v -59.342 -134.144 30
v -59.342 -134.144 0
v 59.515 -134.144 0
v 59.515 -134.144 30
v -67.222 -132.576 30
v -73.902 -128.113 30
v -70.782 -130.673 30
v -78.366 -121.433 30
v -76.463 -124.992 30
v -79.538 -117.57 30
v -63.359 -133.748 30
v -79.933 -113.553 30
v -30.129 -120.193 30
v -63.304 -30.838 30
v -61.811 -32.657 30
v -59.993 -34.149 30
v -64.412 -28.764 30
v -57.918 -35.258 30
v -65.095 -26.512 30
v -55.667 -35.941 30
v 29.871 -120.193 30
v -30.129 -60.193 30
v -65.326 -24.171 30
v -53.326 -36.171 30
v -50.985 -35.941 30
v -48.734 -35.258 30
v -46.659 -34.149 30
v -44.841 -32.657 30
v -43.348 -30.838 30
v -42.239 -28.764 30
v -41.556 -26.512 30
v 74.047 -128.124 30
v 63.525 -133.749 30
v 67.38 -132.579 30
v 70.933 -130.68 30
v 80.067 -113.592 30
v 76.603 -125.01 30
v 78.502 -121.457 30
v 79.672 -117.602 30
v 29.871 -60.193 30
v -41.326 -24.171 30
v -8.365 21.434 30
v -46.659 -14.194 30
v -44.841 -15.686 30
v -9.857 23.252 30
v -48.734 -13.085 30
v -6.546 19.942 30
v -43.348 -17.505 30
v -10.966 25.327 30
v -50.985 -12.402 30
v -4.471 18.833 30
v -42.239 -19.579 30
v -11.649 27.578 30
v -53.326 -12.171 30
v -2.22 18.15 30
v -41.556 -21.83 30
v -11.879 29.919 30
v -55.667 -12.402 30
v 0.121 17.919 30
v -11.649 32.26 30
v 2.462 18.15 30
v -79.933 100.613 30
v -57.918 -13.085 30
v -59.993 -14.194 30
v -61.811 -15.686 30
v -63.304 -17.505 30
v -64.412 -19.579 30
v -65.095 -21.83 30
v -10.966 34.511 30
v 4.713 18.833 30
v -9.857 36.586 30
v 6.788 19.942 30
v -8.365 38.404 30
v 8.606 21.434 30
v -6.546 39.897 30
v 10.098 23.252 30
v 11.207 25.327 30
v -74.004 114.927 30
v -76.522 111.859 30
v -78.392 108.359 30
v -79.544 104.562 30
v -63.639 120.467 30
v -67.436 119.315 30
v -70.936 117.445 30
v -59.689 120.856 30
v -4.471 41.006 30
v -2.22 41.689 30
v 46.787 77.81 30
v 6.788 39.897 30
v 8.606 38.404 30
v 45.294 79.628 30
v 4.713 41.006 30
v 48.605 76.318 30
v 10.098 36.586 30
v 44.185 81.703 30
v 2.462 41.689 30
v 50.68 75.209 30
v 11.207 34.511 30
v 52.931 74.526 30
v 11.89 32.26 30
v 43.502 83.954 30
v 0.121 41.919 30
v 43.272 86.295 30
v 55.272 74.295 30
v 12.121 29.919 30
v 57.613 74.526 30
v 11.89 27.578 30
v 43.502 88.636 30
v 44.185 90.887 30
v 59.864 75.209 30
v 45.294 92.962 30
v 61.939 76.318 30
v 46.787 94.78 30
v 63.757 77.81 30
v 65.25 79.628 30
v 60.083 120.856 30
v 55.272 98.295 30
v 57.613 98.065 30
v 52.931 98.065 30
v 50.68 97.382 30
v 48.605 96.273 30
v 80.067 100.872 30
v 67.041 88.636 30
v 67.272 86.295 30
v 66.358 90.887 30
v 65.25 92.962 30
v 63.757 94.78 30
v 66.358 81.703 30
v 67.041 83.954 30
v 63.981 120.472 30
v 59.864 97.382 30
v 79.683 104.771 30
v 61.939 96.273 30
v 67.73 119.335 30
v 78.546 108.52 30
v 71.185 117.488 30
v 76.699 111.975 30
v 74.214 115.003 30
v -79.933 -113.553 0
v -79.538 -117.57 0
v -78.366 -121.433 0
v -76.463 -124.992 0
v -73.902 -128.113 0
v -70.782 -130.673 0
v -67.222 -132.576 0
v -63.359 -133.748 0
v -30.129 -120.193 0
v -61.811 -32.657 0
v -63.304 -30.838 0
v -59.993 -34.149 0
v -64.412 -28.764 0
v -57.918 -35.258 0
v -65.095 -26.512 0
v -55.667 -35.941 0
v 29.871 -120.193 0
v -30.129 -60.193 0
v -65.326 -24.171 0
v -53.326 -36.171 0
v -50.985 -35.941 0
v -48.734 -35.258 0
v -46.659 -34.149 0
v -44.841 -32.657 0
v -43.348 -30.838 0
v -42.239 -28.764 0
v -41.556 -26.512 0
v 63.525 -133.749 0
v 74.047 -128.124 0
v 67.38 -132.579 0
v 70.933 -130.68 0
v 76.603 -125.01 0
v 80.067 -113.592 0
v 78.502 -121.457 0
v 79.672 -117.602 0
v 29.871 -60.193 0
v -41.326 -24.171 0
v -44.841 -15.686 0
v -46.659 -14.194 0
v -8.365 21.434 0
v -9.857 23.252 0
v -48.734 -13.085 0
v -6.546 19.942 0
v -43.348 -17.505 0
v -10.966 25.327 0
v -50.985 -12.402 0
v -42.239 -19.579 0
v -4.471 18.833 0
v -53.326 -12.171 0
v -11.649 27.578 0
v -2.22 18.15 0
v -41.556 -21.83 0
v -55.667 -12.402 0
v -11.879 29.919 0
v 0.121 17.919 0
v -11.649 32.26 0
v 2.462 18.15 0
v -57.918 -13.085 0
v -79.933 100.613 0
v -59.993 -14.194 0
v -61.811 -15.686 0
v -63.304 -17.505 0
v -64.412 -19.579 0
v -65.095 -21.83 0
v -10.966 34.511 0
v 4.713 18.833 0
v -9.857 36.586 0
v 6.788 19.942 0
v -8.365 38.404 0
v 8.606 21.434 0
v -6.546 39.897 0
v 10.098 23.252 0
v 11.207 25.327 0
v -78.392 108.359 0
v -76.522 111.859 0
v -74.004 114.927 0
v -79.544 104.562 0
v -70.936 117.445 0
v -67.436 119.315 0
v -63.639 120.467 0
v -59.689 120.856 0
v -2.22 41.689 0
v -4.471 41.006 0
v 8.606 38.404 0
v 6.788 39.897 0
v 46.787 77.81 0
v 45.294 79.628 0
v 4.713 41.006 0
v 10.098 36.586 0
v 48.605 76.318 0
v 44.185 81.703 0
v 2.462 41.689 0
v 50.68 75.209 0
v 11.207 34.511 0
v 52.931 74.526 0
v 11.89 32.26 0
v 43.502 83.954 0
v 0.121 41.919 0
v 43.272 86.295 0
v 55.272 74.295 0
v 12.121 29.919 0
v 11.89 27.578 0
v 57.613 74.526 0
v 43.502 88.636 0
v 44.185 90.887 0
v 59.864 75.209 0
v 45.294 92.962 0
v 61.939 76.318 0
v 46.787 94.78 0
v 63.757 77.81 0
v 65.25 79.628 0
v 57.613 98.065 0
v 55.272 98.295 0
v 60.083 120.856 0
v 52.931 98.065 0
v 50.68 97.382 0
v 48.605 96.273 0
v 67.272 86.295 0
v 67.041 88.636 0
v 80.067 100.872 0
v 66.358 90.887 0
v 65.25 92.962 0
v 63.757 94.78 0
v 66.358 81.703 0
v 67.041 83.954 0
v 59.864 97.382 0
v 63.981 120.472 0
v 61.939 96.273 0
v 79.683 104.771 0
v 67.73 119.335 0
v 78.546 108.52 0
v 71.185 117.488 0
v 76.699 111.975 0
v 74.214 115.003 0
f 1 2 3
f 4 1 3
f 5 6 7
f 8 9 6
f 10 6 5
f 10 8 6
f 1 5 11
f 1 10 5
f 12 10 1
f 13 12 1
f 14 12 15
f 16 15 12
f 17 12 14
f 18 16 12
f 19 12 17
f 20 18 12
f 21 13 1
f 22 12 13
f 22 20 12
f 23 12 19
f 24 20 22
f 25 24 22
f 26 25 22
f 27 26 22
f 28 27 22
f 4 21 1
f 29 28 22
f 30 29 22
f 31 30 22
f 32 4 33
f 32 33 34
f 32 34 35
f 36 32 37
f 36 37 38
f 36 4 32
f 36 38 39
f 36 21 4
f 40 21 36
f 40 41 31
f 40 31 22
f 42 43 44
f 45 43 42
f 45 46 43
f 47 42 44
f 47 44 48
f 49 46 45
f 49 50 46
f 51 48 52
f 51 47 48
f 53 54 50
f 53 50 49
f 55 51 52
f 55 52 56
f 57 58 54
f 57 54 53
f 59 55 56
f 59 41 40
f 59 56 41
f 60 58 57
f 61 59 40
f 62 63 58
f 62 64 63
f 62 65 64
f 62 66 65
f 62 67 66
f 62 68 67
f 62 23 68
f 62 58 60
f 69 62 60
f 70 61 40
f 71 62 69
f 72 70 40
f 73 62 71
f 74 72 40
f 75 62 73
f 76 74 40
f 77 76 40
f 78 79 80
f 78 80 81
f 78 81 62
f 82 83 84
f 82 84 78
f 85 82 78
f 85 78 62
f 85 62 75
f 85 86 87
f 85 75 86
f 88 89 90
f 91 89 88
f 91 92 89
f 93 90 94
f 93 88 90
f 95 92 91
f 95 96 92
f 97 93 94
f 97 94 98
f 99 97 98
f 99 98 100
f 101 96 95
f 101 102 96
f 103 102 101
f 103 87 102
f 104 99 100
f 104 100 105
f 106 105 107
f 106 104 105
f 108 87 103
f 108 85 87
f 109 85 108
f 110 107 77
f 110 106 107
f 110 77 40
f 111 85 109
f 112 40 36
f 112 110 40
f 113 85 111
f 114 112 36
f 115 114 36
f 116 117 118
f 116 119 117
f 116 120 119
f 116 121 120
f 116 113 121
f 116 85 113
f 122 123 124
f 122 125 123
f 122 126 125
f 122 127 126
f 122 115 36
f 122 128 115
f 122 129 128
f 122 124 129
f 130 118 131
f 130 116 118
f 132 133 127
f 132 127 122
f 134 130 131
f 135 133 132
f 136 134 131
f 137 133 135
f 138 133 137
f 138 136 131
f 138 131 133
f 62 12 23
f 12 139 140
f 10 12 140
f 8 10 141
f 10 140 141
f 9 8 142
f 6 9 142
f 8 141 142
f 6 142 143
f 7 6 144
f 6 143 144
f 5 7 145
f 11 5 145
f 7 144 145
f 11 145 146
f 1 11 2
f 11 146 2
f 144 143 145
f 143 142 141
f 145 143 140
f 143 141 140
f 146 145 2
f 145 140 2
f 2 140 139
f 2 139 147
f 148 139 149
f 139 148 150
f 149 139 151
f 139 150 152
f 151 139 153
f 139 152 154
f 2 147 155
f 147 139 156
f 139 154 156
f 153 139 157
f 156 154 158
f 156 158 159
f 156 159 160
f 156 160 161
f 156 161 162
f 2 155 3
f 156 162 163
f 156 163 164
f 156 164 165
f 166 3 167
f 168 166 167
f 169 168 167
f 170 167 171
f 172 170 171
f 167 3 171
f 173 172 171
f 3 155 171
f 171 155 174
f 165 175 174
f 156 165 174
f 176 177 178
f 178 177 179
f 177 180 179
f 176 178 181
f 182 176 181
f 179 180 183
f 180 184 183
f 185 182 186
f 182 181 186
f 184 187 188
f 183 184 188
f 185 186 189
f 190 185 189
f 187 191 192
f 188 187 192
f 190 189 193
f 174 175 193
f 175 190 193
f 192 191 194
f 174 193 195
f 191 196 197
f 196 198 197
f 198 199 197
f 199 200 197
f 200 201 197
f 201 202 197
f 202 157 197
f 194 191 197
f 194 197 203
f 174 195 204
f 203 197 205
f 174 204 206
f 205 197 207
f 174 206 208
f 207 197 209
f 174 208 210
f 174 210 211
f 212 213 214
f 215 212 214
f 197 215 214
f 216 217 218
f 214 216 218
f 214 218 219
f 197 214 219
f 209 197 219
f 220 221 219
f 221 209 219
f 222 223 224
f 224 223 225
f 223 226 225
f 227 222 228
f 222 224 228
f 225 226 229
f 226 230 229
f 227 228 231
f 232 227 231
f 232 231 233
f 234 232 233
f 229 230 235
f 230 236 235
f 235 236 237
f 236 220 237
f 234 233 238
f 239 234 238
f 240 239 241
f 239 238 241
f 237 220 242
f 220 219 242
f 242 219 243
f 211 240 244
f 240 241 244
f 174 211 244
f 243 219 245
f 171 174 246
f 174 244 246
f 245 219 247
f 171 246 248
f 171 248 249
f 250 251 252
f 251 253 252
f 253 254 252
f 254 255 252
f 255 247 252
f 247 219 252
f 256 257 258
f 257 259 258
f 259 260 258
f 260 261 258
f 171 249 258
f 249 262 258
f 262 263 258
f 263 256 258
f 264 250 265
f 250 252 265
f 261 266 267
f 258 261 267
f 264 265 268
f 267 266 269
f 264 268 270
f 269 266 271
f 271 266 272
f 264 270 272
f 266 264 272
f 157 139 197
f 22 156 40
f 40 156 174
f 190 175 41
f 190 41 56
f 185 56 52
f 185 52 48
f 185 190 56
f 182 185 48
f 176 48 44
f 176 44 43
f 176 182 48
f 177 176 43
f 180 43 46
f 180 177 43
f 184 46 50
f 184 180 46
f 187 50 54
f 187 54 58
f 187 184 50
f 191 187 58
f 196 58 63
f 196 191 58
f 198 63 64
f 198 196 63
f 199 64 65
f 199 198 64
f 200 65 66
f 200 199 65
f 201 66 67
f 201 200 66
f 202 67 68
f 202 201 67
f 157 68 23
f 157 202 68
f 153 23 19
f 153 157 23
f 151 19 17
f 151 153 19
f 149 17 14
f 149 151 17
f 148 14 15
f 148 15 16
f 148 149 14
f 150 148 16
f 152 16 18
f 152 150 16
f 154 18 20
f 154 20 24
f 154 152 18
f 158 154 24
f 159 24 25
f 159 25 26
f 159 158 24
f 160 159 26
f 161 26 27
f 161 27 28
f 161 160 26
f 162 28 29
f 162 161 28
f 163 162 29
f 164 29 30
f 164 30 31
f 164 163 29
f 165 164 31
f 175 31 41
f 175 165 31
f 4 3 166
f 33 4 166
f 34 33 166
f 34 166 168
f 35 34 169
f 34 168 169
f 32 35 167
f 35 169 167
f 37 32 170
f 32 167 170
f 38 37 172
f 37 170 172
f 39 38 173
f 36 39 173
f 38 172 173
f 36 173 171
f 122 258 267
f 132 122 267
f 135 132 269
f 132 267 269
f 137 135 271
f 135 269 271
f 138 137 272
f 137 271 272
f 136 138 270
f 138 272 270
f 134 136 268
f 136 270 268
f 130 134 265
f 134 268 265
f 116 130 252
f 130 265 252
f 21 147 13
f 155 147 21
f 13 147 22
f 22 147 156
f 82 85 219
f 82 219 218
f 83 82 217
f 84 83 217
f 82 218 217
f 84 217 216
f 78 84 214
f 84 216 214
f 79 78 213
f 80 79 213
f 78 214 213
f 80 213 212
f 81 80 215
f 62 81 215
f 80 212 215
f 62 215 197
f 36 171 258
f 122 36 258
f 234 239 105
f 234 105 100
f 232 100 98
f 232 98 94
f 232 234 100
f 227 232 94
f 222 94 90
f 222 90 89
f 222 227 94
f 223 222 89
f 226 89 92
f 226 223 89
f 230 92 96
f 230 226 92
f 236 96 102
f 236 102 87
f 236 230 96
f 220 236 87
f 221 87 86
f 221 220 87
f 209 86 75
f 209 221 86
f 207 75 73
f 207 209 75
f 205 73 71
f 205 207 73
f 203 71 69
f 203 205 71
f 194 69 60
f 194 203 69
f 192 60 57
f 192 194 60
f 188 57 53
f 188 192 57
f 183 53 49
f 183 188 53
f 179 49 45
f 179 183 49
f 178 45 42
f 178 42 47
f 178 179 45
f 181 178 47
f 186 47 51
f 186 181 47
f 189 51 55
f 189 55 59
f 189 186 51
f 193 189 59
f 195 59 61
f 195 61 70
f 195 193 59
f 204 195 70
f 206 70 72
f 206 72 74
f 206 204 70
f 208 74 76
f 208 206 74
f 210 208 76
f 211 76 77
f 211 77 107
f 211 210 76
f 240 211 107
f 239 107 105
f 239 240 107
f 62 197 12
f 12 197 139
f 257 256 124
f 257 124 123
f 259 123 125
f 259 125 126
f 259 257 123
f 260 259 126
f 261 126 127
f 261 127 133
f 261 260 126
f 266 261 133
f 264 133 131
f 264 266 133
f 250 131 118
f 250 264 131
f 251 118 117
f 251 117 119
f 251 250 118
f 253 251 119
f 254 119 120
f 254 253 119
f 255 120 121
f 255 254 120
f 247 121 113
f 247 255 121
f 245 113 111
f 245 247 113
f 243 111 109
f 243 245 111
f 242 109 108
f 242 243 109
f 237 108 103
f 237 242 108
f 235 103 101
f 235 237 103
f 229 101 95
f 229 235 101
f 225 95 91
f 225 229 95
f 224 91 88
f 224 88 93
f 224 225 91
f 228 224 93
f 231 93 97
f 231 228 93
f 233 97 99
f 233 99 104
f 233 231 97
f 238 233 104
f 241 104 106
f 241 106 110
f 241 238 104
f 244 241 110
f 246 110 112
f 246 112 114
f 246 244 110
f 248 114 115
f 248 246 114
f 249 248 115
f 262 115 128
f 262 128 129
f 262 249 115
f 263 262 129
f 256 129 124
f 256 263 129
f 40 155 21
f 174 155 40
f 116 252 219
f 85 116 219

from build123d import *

# Parameters (mm, degrees)
SKETCH_R     = 12
SKETCH_W     = 60
SKETCH_H     = 60
PAD_DEPTH    = 30
PAD001_DEPTH = 30


with BuildPart() as part:
    # Sketch → Pad (new body)
    with BuildSketch(Plane.XY):
        with BuildLine():
            Line((-59.342312, -134.143673), (59.515305, -134.143673))
            ThreePointArc((59.515305, -134.143673), (74.047401, -128.124281), (80.066793, -113.592185))
            Line((80.066793, -113.592185), (80.066793, 100.872214))
            ThreePointArc((80.066793, 100.872214), (74.213582, 115.003116), (60.08268, 120.856327))
            Line((60.08268, 120.856327), (-59.689381, 120.856327))
            ThreePointArc((-59.689381, 120.856327), (-74.003928, 114.927048), (-79.933207, 100.612501))
            Line((-79.933207, 100.612501), (-79.933207, -113.552778))
            ThreePointArc((-79.933207, -113.552778), (-73.902274, -128.112739), (-59.342312, -134.143673))
        make_face()
        with Locations((0.120778, 29.919195)):
            Circle(SKETCH_R, mode=Mode.SUBTRACT)
        with Locations((-53.325886, -24.171413)):
            Circle(SKETCH_R, mode=Mode.SUBTRACT)
        with Locations((55.271923, 86.295181)):
            Circle(SKETCH_R, mode=Mode.SUBTRACT)
        with Locations((-0.129082, -90.192567)):
            Rectangle(SKETCH_W, SKETCH_H, mode=Mode.SUBTRACT)
    extrude(amount=PAD_DEPTH)

    # Sketch → Pad001 (join)
    with BuildSketch(Plane.XY):
        with BuildLine():
            Line((-59.342312, -134.143673), (59.515305, -134.143673))
            ThreePointArc((59.515305, -134.143673), (74.047401, -128.124281), (80.066793, -113.592185))
            Line((80.066793, -113.592185), (80.066793, 100.872214))
            ThreePointArc((80.066793, 100.872214), (74.213582, 115.003116), (60.08268, 120.856327))
            Line((60.08268, 120.856327), (-59.689381, 120.856327))
            ThreePointArc((-59.689381, 120.856327), (-74.003928, 114.927048), (-79.933207, 100.612501))
            Line((-79.933207, 100.612501), (-79.933207, -113.552778))
            ThreePointArc((-79.933207, -113.552778), (-73.902274, -128.112739), (-59.342312, -134.143673))
        make_face()
        with Locations((0.120778, 29.919195)):
            Circle(SKETCH_R, mode=Mode.SUBTRACT)
        with Locations((-53.325886, -24.171413)):
            Circle(SKETCH_R, mode=Mode.SUBTRACT)
        with Locations((55.271923, 86.295181)):
            Circle(SKETCH_R, mode=Mode.SUBTRACT)
        with Locations((-0.129082, -90.192567)):
            Rectangle(SKETCH_W, SKETCH_H, mode=Mode.SUBTRACT)
    extrude(amount=PAD001_DEPTH)


solid = part.part
